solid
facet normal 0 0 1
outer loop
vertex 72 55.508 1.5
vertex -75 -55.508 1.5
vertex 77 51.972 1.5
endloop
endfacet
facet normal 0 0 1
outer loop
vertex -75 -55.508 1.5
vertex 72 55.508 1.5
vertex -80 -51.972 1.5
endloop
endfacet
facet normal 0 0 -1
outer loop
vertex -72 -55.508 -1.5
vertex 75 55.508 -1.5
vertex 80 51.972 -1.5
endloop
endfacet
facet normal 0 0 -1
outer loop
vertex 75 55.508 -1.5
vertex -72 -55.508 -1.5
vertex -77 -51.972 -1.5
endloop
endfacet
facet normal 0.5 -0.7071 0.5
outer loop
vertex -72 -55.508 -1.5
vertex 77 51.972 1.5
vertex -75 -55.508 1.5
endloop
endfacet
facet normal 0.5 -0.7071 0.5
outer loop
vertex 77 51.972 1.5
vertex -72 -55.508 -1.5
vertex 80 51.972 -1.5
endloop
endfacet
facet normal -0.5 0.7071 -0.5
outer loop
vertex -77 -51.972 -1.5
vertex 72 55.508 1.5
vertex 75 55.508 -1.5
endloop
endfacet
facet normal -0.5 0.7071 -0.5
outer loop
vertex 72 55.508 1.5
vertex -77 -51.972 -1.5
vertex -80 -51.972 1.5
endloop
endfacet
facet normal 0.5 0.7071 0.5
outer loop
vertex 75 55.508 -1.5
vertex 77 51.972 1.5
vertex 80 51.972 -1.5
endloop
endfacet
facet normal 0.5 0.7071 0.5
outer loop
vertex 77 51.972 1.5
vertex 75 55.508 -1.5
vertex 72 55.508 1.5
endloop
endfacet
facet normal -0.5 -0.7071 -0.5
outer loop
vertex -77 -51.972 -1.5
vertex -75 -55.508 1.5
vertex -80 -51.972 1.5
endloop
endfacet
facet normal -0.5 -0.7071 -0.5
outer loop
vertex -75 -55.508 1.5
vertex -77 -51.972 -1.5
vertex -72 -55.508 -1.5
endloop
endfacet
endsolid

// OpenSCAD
// Parameters
sheet_length = 200; //[100:400:1]
sheet_width = 150; //[75:300:1]
sheet_thickness = 3; //[1.5:6:0.5]
corner_radius = 10; //[5:20:1]
chamfer_size = 1; //[0.5:3:0.5]
hole_diameter = 6; //[3:12:0.5]
hole_edge_margin = 15; //[8:30:1]
hole_clearance_z = 1; //[0.5:2:0.5]

// Main module
module final_plate() {
  difference() {
    intersection() {
      intersection() {
        // Base sheet with rounded corners
        linear_extrude(height = sheet_thickness, center = true) {
          offset(r = corner_radius) {
            square([sheet_length - 2 * corner_radius, sheet_width - 2 * corner_radius], center = true);
          }
        }
        // Chamfered edges
        rotate([45, 45, 0]) {
          cube([sheet_length + 2 * chamfer_size, sheet_width + 2 * chamfer_size, sheet_thickness + 2 * chamfer_size], center = true);
        }
      }
    }
    // Mounting holes
    union() {
      for (x = [-1, 1], y = [-1, 1]) {
        translate([x * (sheet_length / 2 - hole_edge_margin), y * (sheet_width / 2 - hole_edge_margin), 0]) {
          cylinder(r = hole_diameter / 2, h = sheet_thickness + 2 * hole_clearance_z, center = true);
        }
      }
    }
  }
}

// Render the final plate
color("Silver") final_plate();
